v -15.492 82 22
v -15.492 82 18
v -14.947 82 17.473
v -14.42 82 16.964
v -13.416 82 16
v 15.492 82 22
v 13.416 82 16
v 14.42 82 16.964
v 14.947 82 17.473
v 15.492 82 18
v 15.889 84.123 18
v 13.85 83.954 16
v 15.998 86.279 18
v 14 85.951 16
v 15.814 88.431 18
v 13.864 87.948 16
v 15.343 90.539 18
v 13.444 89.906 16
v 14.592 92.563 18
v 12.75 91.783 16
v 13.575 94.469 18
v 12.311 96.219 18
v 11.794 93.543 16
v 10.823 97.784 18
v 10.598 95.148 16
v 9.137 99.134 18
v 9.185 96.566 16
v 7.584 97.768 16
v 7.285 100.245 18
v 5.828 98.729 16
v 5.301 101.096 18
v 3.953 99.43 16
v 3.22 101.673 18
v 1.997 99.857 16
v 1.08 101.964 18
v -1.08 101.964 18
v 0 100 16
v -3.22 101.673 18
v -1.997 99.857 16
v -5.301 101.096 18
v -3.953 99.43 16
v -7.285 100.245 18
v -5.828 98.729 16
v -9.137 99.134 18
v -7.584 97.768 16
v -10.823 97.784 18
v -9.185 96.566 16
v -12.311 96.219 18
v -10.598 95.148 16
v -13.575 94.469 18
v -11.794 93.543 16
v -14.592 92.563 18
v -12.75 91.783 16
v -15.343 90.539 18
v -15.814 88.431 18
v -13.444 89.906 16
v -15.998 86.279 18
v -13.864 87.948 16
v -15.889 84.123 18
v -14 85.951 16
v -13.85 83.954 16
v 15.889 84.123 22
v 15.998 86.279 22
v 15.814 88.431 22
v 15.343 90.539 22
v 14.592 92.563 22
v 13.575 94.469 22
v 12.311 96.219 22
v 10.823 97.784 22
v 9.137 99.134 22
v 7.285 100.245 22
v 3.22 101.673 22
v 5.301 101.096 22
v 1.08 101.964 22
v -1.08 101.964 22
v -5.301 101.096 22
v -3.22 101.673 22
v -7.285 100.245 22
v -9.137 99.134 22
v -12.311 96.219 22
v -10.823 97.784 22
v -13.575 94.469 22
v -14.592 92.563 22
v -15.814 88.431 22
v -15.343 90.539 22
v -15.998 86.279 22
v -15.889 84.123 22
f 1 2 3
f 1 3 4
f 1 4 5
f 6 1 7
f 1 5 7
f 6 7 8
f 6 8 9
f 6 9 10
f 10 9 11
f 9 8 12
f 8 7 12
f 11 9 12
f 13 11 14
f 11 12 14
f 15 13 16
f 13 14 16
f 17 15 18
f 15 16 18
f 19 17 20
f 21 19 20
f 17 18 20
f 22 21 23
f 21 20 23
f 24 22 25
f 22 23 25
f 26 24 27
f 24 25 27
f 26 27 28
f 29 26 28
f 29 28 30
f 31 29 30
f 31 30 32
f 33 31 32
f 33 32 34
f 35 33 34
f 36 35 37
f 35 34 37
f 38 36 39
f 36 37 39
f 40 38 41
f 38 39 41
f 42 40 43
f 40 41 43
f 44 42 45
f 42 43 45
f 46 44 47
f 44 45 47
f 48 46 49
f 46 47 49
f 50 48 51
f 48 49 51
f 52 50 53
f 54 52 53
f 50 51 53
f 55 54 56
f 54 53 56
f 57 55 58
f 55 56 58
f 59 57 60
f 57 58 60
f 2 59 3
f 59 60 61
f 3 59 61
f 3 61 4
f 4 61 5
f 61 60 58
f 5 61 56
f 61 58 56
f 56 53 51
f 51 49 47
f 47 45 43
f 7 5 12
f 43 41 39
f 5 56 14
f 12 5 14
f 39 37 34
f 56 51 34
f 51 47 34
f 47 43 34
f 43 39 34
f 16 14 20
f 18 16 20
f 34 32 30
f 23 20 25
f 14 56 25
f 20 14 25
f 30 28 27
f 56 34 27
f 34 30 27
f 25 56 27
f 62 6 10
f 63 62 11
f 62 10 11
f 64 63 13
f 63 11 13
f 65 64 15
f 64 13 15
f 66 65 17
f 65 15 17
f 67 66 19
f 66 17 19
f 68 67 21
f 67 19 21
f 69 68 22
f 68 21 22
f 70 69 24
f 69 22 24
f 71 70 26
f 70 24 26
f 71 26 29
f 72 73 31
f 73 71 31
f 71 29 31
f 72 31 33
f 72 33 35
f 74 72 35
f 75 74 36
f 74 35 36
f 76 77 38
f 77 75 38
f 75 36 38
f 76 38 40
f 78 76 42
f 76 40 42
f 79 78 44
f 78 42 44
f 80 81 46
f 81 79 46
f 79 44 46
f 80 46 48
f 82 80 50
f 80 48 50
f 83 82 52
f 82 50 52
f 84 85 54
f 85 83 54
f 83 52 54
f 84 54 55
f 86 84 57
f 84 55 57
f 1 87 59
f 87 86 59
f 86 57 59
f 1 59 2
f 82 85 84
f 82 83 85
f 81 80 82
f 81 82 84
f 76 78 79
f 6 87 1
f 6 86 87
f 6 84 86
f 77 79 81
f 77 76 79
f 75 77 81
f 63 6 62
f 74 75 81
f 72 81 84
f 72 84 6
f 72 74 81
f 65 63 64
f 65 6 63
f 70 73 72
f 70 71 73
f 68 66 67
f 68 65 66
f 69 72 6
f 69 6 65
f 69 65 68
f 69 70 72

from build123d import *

# Parameters (mm, degrees)
BOX991_W           = 148
BOX991_H           = 40
BOX991_DEPTH       = 40
CYLINDER2098_R     = 16
CYLINDER2098_DEPTH = 6
CHAMFER080_SIZE    = 2


with BuildPart() as krychle991:
    # Box991 → Box991 (new body)
    with BuildSketch(Plane(origin=(-74, 42, 16), x_dir=(1, 0, 0), z_dir=(0, 0, 1))):
        with Locations((74, 20)):
            Rectangle(BOX991_W, BOX991_H)
    extrude(amount=BOX991_DEPTH)


with BuildPart() as chamfer080:
    # Cylinder2098 → Cylinder2098 (new body)
    with BuildSketch(Plane(origin=(0, 86, 16), x_dir=(1, 0, 0), z_dir=(0, 0, 1))):
        Circle(CYLINDER2098_R)
    extrude(amount=CYLINDER2098_DEPTH)

    # Cut691: cut Krychle991
    add(krychle991.part, mode=Mode.SUBTRACT)

    # Chamfer080
    chamfer080_edges = [chamfer080.edges().sort_by_distance(p)[0] for p in [
        (-2.016069, 101.872475, 16),
    ]]
    chamfer(chamfer080_edges, length=CHAMFER080_SIZE)


solid = chamfer080.part
